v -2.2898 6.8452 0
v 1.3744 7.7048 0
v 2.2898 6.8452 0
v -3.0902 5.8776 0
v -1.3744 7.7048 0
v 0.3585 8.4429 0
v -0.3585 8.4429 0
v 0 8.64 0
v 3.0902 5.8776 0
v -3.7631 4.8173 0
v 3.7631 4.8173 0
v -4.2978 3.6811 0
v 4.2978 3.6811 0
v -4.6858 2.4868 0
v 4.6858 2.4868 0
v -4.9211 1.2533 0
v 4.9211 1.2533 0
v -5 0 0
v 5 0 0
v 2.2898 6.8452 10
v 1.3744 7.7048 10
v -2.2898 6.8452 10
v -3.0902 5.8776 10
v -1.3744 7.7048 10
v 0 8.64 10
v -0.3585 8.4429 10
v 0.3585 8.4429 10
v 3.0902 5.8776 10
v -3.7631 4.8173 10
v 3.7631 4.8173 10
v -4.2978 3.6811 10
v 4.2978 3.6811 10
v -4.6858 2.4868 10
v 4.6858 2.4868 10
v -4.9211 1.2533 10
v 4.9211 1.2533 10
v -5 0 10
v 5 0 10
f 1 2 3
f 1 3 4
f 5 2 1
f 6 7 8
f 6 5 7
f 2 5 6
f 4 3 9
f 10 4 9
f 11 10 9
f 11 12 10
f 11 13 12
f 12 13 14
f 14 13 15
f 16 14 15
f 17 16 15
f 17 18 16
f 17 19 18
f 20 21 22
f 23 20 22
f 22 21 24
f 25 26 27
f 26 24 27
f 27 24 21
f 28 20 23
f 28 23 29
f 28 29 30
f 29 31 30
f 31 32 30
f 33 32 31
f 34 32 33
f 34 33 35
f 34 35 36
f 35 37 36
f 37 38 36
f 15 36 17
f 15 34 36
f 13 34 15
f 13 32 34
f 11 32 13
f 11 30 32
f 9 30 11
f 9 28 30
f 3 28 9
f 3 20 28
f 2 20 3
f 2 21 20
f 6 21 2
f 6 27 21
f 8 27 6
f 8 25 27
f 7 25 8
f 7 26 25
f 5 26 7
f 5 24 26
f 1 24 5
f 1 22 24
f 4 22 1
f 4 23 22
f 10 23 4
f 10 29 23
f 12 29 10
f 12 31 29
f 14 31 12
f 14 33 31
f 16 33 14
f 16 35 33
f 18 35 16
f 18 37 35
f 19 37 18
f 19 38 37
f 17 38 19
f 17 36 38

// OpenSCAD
module arch_inner(width, height) {
    assert(height >= width/2, "Can't intersect circles with height < width/2");
    hwidth = width/2;
    // half the angle of the triangle from one base, to the peak, to the
    // other base - i.e. the angle from the centre vertical to one base.
    htopang = atan2(hwidth, height);
    // The distance between the peak and one base.
    pk2base = sqrt(hwidth*hwidth + height*height);
    // Due to equivalent triangles, the circle radius is the hypotenuse
    // of the triangle formed by one base, to half way along the line from
    // base to peak.  
    c_rad = (pk2base/2) / sin(htopang);
    c_offset = c_rad - hwidth;
    intersection() {
        translate([-c_offset, 0]) circle(r=c_rad);
        translate([+c_offset, 0]) circle(r=c_rad);
        translate([-hwidth, 0]) square([width, height]);
    }
}

$fn=50;
linear_extrude(10) arch_inner(10, 8.66);
